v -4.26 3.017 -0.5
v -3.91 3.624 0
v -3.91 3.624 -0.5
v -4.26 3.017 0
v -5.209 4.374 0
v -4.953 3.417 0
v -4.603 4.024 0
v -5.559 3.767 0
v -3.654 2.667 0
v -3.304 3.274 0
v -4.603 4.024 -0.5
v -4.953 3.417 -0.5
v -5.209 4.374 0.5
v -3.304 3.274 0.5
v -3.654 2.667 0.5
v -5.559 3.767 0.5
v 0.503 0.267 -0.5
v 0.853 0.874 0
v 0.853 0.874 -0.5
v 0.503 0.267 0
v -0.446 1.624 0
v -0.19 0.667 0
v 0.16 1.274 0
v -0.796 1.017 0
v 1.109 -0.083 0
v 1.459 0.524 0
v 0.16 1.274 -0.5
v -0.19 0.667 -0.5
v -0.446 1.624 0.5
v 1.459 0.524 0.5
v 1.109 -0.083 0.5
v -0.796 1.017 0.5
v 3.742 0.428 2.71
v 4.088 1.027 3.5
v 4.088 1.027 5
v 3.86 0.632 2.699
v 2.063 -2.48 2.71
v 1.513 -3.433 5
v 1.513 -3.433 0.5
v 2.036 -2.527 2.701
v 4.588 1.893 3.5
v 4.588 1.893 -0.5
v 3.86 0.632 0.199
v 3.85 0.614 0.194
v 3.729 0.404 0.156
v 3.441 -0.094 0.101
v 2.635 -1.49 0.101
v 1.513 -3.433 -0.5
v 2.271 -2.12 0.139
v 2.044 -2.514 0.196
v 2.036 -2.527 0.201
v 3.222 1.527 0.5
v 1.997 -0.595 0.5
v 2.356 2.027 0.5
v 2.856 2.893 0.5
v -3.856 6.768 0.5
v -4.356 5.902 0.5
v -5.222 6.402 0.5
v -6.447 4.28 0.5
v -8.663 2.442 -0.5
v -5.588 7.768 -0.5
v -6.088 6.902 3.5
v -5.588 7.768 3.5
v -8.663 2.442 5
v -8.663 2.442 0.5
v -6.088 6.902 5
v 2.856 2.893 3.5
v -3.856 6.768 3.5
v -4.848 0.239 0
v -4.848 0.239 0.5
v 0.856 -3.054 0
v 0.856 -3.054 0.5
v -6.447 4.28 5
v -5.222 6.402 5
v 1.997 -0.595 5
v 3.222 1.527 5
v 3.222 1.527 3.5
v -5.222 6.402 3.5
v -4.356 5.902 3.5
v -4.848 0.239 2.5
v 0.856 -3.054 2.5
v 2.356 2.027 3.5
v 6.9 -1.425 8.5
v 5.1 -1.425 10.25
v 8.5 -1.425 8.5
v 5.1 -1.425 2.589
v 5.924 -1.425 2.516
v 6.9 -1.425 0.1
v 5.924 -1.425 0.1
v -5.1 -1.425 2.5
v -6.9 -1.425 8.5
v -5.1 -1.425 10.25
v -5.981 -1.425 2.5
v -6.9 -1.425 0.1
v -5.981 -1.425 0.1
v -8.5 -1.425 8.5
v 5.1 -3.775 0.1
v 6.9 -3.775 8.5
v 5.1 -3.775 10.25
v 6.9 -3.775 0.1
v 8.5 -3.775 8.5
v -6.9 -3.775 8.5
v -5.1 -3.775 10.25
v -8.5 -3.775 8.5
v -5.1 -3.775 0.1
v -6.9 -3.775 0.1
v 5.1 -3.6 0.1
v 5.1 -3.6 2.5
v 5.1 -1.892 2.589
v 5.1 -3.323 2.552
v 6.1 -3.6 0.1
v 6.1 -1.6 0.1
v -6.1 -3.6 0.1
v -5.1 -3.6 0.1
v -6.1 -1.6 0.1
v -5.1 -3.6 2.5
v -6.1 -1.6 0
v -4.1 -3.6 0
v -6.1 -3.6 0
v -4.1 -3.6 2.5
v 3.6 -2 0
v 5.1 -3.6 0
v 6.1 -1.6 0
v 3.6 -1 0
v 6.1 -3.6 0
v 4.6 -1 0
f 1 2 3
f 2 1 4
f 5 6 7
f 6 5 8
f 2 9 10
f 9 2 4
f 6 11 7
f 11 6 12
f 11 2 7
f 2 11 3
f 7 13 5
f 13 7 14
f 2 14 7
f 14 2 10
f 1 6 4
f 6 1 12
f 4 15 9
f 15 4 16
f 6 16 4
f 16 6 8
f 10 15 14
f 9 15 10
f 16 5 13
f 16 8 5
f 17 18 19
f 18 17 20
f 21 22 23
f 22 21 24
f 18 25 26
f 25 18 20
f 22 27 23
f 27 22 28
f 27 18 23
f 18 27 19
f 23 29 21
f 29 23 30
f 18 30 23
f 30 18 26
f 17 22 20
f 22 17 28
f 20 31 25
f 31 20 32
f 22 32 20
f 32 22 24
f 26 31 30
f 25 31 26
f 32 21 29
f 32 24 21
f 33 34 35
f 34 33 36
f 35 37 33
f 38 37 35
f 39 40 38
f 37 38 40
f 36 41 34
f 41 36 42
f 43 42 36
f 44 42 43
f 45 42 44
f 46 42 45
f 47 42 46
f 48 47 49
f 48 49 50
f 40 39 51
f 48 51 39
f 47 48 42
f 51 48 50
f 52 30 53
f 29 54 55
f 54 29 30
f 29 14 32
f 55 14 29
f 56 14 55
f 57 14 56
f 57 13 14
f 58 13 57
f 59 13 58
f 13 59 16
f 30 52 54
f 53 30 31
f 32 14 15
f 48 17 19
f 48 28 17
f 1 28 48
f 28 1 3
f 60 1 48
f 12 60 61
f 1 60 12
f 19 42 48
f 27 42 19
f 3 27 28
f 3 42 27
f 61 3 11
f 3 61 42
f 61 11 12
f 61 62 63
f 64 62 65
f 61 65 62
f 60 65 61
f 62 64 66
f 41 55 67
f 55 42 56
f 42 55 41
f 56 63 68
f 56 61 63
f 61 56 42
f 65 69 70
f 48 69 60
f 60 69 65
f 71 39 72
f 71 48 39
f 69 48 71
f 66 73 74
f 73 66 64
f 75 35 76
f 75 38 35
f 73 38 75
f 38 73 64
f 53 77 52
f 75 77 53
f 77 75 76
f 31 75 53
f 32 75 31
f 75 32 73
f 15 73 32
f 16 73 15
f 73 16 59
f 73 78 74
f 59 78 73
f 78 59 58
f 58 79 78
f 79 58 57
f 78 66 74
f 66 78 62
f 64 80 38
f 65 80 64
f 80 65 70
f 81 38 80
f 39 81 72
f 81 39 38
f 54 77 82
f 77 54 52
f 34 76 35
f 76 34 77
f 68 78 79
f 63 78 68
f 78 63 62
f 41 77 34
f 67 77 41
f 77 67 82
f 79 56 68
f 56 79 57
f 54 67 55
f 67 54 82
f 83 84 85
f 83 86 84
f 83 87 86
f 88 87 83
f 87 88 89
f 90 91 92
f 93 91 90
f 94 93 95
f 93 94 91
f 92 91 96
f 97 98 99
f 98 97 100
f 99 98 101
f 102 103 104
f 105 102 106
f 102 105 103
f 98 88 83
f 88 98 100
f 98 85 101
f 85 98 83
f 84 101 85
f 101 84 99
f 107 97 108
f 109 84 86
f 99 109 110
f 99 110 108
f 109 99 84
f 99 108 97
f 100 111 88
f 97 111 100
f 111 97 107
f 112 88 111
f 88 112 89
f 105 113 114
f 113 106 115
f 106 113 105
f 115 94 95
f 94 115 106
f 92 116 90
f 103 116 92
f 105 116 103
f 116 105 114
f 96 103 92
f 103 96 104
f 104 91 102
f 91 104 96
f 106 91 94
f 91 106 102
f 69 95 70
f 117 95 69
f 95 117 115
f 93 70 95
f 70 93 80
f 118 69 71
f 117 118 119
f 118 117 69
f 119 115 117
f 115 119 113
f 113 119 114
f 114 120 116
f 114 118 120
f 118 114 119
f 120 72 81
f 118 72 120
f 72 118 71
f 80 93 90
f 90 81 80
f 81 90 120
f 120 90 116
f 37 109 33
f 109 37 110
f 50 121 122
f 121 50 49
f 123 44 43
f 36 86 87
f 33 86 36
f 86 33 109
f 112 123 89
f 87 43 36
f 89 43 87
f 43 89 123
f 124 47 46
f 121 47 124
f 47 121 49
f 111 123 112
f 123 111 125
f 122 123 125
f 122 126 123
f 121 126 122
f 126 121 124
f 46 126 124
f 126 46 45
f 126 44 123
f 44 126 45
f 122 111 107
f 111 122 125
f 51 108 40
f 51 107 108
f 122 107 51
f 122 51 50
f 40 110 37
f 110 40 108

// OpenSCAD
union () {
  translate ([-3, 0.5, 2.75]) {
    rotate (a=-30.00000000000001, v=[0, 0, 1]) {
      translate ([0, 4, 0]) {
        union () {
          linear_extrude (height=4.5, center=true){
            union () {
              translate ([4.875, -4.15, ]) {
                square ([1, 4.15]);
              }
              translate ([-4.875, -4.15, ]) {
                mirror ([1, 0, ]) {
                  square ([1, 4.15]);
                }
              }
              translate ([0, -3.8000000000000003, ]) {
                square ([11.75, 2.7], center=true);
              }
            }
          }
          translate ([0, 0, -0.75]) {
            linear_extrude (height=3, center=true){
              union () {
                translate ([-5.875, 0, ]) {
                  polygon (points=[[0, 0], [2, 0], [2, 1], [0, 1]]);
                }
                translate ([5.875, 0, ]) {
                  mirror ([1, 0, ]) {
                    polygon (points=[[0, 0], [2, 0], [2, 1], [0, 1]]);
                  }
                }
              }
            }
          }
          difference () {
            translate ([0, -2.075, -2.75]) {
              cube ([11.75, 6.15, 1], center=true);
            }
            translate ([0, -2.45, 0]) {
              union () {
                translate ([-2.75, 0, -6.75]) {
                  translate ([0, 0.35, 0]) {
                    union () {
                      translate ([0, 0, 2]) {
                        cube ([0.8, 0.7, 4], center=true);
                      }
                      translate ([0, 0, 6.5]) {
                        cube ([2.2, 0.7, 5], center=true);
                      }
                      translate ([0, 0, 9.5]) {
                        cube ([1.7, 0.7, 1], center=true);
                      }
                    }
                  }
                }
                translate ([2.75, 0, -6.75]) {
                  translate ([0, 0.35, 0]) {
                    union () {
                      translate ([0, 0, 2]) {
                        cube ([0.8, 0.7, 4], center=true);
                      }
                      translate ([0, 0, 6.5]) {
                        cube ([2.2, 0.7, 5], center=true);
                      }
                      translate ([0, 0, 9.5]) {
                        cube ([1.7, 0.7, 1], center=true);
                      }
                    }
                  }
                }
              }
            }
          }
        }
      }
    }
  }
  translate ([0, -2.6, 8.5]) {
    rotate (a=90.0, v=[1, 0, 0]) {
      linear_extrude (height=2.35, center=true){
        union () {
          translate ([5.1, 0, 0]) {
            polygon (points=[[0, 1.75], [3.4, 0], [0, 0]]);
          }
          translate ([-5.1, 0, 0]) {
            mirror ([1, 0, ]) {
              polygon (points=[[0, 1.75], [3.4, 0], [0, 0]]);
            }
          }
          translate ([5.1, 0, 0]) {
            translate ([0, -8.4, ]) {
              square ([1.8, 8.4]);
            }
          }
          translate ([-5.1, 0, 0]) {
            mirror ([1, 0, ]) {
              translate ([0, -8.4, ]) {
                square ([1.8, 8.4]);
              }
            }
          }
        }
      }
    }
  }
  hull () {
    translate ([-1.5999999999999996, -1.2, 1.25]) {
      rotate (a=-30.00000000000001, v=[0, 0, 1]) {
        cube ([7, 0.1, 2.5], center=true);
      }
    }
    translate ([-5.1, -2.6, 1.25]) {
      cube ([2, 2, 2.5], center=true);
    }
  }
  hull () {
    translate ([-3, 0.5, 2.75]) {
      rotate (a=-30.00000000000001, v=[0, 0, 1]) {
        translate ([0, 4, 0]) {
          translate ([5.05, -2.25, -1.25]) {
            cube ([0.1, 4, 2.5], center=true);
          }
        }
      }
    }
    translate ([4.1, -1.5, 1.25]) {
      cube ([1, 1, 2.5], center=true);
    }
    translate ([5.6, -2.6, 1.25]) {
      cube ([1, 2, 2.5], center=true);
    }
  }
}
